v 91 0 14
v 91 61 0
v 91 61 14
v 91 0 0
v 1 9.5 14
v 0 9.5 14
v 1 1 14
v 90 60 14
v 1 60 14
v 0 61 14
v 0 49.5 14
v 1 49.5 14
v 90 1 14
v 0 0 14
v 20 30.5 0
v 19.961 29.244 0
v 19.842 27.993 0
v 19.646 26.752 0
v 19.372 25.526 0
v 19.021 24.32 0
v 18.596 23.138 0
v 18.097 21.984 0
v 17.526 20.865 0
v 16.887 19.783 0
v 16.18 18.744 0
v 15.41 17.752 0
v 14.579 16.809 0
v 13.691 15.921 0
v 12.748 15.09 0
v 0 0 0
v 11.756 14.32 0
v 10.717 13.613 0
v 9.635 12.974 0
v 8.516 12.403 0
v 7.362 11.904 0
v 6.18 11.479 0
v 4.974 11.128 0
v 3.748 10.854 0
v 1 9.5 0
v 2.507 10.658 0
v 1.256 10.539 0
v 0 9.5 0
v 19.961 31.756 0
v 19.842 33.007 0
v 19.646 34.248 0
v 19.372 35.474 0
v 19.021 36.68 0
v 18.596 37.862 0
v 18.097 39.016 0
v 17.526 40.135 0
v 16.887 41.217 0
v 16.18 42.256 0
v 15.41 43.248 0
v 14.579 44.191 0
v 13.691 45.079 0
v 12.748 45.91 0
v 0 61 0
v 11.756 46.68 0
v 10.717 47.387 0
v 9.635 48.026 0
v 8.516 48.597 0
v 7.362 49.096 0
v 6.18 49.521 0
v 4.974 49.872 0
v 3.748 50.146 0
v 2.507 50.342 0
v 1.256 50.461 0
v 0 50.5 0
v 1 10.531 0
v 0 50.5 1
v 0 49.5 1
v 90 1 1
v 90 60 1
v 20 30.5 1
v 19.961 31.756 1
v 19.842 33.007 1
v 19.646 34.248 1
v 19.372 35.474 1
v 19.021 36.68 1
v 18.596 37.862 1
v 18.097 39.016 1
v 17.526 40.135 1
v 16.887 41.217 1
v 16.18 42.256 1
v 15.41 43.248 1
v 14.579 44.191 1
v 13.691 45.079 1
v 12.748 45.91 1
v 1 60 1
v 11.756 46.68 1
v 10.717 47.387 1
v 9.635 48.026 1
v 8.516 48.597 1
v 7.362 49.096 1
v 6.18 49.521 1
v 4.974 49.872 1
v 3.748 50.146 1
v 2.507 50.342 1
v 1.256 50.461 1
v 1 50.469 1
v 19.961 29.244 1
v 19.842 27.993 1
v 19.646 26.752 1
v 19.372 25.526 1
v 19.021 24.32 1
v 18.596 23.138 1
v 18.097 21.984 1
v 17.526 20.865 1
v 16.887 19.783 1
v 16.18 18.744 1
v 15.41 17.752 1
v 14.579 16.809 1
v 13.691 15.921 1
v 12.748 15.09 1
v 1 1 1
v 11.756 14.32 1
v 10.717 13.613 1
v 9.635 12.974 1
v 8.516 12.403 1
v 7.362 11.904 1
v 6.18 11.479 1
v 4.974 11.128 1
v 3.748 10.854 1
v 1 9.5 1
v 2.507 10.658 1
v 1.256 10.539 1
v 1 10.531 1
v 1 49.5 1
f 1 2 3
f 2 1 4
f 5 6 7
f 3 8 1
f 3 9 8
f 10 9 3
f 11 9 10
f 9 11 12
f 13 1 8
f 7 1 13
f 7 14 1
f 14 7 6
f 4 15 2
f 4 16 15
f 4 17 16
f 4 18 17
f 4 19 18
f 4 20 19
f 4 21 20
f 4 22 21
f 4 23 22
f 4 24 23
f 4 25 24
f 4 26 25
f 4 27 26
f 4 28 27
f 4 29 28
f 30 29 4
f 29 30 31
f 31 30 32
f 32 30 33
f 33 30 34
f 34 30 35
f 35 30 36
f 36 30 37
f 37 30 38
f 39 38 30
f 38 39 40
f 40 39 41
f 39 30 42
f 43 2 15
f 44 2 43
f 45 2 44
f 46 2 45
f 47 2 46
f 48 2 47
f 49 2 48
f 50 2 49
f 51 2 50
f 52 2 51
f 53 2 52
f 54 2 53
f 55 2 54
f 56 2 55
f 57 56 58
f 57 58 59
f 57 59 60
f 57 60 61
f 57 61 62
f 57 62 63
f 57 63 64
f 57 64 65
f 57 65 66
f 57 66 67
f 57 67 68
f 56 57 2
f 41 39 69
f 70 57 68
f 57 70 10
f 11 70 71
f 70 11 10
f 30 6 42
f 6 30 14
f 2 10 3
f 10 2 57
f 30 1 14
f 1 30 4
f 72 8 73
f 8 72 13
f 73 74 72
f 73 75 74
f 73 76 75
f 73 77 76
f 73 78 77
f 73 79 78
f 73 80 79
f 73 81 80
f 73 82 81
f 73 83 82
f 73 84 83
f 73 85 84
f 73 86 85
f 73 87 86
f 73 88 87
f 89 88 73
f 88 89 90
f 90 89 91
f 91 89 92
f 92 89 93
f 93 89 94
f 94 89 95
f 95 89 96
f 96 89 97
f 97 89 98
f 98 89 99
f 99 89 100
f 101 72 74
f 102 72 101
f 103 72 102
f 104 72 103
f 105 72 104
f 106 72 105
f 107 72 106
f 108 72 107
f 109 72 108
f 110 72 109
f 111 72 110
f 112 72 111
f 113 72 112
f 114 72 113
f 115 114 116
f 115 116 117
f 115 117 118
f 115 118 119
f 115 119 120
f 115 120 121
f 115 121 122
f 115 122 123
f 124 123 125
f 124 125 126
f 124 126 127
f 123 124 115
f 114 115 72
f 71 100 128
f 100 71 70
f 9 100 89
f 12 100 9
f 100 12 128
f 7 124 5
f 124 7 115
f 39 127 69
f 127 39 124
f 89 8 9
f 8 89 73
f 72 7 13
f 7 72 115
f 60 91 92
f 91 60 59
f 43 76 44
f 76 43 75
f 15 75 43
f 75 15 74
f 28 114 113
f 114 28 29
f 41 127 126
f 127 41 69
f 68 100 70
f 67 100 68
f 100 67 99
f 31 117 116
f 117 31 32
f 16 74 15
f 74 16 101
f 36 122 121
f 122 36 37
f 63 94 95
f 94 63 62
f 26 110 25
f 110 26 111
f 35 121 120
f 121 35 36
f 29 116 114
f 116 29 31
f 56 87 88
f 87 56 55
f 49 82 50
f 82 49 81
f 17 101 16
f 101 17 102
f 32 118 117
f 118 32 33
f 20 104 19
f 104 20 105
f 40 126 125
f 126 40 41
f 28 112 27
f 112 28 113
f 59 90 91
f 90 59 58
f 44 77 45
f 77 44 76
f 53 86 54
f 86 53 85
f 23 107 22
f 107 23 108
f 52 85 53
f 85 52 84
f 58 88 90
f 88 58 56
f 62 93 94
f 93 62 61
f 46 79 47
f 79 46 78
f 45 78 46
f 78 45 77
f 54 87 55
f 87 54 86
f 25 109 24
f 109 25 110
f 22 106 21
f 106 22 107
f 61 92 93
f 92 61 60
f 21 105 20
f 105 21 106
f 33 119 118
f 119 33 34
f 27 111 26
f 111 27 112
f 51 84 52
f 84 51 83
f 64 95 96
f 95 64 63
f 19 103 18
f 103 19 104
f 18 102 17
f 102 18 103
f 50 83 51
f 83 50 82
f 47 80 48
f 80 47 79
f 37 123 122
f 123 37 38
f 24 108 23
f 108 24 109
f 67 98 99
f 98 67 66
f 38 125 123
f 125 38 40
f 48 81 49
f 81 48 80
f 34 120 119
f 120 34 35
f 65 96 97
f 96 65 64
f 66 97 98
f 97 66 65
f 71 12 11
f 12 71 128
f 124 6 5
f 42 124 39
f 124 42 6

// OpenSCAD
// Karten: 87mm x 57mm -> 89x59
// Automa: 10mm hoch -> 13mm
// Bonuskarten: 13mm -> 15mm
// Vogelkarten: 30mm hoch -> 32mm
// Rahmen: 1mm

// Wertungsblock: 112x81mm

hoehe = 13;
$fn = 100;

difference(){
    cube([91,61,hoehe+1]);
    translate([1,1,1]){
        cube([89,59,hoehe]);
    }
    translate([0,61/2,0]){
        linear_extrude(1){
            circle(20);
        }
    }
    #translate([0,19/2,0]){
        cube([1,40,hoehe+1]);
    }
}
